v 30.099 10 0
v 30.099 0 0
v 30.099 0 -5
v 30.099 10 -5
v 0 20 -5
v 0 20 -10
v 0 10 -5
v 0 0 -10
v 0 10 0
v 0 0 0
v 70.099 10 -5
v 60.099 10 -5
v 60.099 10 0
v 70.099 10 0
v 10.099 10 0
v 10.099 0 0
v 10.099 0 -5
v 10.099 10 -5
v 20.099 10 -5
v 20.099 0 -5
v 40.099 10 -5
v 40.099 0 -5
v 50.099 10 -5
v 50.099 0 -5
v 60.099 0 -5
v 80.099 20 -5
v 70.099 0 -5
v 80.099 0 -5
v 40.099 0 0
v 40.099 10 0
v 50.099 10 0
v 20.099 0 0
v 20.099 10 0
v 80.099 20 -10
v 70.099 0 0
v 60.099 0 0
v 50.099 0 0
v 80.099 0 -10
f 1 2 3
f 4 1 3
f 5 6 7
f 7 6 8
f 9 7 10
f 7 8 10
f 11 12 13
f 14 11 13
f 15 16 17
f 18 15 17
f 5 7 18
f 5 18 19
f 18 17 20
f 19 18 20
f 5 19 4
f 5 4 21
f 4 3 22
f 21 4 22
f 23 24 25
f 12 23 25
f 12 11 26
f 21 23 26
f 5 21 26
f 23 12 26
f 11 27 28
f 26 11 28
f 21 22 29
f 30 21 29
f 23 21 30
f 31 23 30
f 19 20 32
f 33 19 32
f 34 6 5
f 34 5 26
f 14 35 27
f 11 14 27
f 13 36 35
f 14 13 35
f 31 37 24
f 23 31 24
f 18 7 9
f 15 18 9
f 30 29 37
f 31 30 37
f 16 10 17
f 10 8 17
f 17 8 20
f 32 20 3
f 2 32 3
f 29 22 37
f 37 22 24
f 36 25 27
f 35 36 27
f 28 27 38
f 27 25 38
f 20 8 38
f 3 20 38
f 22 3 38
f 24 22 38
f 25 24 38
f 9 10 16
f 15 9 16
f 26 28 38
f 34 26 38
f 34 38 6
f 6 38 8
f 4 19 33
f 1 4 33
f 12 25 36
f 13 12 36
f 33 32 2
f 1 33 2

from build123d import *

# Parameters (mm, degrees)
EXTRUDE_1_DEPTH     = 20
SKETCH_2_W          = 5
SKETCH_2_H          = 10
CUT_EXTRUDE_1_DEPTH = 81.099407002


with BuildPart() as part:
    # Эскиз1 → Бобышка-Вытянуть1 (new body)
    with BuildSketch(Plane(origin=(0, 0, 0), x_dir=(1, 0, 0), z_dir=(0, 1, 0))):
        Polygon((0, 0), (10.099407002, 0), (10.099407002, 5), (20.099407002, 5), (20.099407002, 0), (30.099407002, 0), (30.099407002, 5), (40.099407002, 5), (40.099407002, 0), (50.099407002, 0), (50.099407002, 5), (60.099407002, 5), (60.099407002, 0), (70.099407002, 0), (70.099407002, 5), (80.099407002, 5), (80.099407002, 10), (0, 10), align=None)
    extrude(amount=EXTRUDE_1_DEPTH)

    # Эскиз2 → Вырез-Вытянуть1 (cut, through all)
    with BuildSketch(Plane.ZY):
        with Locations((-2.5, 15)):
            Rectangle(SKETCH_2_W, SKETCH_2_H)
    extrude(amount=-CUT_EXTRUDE_1_DEPTH, mode=Mode.SUBTRACT)


solid = part.part
